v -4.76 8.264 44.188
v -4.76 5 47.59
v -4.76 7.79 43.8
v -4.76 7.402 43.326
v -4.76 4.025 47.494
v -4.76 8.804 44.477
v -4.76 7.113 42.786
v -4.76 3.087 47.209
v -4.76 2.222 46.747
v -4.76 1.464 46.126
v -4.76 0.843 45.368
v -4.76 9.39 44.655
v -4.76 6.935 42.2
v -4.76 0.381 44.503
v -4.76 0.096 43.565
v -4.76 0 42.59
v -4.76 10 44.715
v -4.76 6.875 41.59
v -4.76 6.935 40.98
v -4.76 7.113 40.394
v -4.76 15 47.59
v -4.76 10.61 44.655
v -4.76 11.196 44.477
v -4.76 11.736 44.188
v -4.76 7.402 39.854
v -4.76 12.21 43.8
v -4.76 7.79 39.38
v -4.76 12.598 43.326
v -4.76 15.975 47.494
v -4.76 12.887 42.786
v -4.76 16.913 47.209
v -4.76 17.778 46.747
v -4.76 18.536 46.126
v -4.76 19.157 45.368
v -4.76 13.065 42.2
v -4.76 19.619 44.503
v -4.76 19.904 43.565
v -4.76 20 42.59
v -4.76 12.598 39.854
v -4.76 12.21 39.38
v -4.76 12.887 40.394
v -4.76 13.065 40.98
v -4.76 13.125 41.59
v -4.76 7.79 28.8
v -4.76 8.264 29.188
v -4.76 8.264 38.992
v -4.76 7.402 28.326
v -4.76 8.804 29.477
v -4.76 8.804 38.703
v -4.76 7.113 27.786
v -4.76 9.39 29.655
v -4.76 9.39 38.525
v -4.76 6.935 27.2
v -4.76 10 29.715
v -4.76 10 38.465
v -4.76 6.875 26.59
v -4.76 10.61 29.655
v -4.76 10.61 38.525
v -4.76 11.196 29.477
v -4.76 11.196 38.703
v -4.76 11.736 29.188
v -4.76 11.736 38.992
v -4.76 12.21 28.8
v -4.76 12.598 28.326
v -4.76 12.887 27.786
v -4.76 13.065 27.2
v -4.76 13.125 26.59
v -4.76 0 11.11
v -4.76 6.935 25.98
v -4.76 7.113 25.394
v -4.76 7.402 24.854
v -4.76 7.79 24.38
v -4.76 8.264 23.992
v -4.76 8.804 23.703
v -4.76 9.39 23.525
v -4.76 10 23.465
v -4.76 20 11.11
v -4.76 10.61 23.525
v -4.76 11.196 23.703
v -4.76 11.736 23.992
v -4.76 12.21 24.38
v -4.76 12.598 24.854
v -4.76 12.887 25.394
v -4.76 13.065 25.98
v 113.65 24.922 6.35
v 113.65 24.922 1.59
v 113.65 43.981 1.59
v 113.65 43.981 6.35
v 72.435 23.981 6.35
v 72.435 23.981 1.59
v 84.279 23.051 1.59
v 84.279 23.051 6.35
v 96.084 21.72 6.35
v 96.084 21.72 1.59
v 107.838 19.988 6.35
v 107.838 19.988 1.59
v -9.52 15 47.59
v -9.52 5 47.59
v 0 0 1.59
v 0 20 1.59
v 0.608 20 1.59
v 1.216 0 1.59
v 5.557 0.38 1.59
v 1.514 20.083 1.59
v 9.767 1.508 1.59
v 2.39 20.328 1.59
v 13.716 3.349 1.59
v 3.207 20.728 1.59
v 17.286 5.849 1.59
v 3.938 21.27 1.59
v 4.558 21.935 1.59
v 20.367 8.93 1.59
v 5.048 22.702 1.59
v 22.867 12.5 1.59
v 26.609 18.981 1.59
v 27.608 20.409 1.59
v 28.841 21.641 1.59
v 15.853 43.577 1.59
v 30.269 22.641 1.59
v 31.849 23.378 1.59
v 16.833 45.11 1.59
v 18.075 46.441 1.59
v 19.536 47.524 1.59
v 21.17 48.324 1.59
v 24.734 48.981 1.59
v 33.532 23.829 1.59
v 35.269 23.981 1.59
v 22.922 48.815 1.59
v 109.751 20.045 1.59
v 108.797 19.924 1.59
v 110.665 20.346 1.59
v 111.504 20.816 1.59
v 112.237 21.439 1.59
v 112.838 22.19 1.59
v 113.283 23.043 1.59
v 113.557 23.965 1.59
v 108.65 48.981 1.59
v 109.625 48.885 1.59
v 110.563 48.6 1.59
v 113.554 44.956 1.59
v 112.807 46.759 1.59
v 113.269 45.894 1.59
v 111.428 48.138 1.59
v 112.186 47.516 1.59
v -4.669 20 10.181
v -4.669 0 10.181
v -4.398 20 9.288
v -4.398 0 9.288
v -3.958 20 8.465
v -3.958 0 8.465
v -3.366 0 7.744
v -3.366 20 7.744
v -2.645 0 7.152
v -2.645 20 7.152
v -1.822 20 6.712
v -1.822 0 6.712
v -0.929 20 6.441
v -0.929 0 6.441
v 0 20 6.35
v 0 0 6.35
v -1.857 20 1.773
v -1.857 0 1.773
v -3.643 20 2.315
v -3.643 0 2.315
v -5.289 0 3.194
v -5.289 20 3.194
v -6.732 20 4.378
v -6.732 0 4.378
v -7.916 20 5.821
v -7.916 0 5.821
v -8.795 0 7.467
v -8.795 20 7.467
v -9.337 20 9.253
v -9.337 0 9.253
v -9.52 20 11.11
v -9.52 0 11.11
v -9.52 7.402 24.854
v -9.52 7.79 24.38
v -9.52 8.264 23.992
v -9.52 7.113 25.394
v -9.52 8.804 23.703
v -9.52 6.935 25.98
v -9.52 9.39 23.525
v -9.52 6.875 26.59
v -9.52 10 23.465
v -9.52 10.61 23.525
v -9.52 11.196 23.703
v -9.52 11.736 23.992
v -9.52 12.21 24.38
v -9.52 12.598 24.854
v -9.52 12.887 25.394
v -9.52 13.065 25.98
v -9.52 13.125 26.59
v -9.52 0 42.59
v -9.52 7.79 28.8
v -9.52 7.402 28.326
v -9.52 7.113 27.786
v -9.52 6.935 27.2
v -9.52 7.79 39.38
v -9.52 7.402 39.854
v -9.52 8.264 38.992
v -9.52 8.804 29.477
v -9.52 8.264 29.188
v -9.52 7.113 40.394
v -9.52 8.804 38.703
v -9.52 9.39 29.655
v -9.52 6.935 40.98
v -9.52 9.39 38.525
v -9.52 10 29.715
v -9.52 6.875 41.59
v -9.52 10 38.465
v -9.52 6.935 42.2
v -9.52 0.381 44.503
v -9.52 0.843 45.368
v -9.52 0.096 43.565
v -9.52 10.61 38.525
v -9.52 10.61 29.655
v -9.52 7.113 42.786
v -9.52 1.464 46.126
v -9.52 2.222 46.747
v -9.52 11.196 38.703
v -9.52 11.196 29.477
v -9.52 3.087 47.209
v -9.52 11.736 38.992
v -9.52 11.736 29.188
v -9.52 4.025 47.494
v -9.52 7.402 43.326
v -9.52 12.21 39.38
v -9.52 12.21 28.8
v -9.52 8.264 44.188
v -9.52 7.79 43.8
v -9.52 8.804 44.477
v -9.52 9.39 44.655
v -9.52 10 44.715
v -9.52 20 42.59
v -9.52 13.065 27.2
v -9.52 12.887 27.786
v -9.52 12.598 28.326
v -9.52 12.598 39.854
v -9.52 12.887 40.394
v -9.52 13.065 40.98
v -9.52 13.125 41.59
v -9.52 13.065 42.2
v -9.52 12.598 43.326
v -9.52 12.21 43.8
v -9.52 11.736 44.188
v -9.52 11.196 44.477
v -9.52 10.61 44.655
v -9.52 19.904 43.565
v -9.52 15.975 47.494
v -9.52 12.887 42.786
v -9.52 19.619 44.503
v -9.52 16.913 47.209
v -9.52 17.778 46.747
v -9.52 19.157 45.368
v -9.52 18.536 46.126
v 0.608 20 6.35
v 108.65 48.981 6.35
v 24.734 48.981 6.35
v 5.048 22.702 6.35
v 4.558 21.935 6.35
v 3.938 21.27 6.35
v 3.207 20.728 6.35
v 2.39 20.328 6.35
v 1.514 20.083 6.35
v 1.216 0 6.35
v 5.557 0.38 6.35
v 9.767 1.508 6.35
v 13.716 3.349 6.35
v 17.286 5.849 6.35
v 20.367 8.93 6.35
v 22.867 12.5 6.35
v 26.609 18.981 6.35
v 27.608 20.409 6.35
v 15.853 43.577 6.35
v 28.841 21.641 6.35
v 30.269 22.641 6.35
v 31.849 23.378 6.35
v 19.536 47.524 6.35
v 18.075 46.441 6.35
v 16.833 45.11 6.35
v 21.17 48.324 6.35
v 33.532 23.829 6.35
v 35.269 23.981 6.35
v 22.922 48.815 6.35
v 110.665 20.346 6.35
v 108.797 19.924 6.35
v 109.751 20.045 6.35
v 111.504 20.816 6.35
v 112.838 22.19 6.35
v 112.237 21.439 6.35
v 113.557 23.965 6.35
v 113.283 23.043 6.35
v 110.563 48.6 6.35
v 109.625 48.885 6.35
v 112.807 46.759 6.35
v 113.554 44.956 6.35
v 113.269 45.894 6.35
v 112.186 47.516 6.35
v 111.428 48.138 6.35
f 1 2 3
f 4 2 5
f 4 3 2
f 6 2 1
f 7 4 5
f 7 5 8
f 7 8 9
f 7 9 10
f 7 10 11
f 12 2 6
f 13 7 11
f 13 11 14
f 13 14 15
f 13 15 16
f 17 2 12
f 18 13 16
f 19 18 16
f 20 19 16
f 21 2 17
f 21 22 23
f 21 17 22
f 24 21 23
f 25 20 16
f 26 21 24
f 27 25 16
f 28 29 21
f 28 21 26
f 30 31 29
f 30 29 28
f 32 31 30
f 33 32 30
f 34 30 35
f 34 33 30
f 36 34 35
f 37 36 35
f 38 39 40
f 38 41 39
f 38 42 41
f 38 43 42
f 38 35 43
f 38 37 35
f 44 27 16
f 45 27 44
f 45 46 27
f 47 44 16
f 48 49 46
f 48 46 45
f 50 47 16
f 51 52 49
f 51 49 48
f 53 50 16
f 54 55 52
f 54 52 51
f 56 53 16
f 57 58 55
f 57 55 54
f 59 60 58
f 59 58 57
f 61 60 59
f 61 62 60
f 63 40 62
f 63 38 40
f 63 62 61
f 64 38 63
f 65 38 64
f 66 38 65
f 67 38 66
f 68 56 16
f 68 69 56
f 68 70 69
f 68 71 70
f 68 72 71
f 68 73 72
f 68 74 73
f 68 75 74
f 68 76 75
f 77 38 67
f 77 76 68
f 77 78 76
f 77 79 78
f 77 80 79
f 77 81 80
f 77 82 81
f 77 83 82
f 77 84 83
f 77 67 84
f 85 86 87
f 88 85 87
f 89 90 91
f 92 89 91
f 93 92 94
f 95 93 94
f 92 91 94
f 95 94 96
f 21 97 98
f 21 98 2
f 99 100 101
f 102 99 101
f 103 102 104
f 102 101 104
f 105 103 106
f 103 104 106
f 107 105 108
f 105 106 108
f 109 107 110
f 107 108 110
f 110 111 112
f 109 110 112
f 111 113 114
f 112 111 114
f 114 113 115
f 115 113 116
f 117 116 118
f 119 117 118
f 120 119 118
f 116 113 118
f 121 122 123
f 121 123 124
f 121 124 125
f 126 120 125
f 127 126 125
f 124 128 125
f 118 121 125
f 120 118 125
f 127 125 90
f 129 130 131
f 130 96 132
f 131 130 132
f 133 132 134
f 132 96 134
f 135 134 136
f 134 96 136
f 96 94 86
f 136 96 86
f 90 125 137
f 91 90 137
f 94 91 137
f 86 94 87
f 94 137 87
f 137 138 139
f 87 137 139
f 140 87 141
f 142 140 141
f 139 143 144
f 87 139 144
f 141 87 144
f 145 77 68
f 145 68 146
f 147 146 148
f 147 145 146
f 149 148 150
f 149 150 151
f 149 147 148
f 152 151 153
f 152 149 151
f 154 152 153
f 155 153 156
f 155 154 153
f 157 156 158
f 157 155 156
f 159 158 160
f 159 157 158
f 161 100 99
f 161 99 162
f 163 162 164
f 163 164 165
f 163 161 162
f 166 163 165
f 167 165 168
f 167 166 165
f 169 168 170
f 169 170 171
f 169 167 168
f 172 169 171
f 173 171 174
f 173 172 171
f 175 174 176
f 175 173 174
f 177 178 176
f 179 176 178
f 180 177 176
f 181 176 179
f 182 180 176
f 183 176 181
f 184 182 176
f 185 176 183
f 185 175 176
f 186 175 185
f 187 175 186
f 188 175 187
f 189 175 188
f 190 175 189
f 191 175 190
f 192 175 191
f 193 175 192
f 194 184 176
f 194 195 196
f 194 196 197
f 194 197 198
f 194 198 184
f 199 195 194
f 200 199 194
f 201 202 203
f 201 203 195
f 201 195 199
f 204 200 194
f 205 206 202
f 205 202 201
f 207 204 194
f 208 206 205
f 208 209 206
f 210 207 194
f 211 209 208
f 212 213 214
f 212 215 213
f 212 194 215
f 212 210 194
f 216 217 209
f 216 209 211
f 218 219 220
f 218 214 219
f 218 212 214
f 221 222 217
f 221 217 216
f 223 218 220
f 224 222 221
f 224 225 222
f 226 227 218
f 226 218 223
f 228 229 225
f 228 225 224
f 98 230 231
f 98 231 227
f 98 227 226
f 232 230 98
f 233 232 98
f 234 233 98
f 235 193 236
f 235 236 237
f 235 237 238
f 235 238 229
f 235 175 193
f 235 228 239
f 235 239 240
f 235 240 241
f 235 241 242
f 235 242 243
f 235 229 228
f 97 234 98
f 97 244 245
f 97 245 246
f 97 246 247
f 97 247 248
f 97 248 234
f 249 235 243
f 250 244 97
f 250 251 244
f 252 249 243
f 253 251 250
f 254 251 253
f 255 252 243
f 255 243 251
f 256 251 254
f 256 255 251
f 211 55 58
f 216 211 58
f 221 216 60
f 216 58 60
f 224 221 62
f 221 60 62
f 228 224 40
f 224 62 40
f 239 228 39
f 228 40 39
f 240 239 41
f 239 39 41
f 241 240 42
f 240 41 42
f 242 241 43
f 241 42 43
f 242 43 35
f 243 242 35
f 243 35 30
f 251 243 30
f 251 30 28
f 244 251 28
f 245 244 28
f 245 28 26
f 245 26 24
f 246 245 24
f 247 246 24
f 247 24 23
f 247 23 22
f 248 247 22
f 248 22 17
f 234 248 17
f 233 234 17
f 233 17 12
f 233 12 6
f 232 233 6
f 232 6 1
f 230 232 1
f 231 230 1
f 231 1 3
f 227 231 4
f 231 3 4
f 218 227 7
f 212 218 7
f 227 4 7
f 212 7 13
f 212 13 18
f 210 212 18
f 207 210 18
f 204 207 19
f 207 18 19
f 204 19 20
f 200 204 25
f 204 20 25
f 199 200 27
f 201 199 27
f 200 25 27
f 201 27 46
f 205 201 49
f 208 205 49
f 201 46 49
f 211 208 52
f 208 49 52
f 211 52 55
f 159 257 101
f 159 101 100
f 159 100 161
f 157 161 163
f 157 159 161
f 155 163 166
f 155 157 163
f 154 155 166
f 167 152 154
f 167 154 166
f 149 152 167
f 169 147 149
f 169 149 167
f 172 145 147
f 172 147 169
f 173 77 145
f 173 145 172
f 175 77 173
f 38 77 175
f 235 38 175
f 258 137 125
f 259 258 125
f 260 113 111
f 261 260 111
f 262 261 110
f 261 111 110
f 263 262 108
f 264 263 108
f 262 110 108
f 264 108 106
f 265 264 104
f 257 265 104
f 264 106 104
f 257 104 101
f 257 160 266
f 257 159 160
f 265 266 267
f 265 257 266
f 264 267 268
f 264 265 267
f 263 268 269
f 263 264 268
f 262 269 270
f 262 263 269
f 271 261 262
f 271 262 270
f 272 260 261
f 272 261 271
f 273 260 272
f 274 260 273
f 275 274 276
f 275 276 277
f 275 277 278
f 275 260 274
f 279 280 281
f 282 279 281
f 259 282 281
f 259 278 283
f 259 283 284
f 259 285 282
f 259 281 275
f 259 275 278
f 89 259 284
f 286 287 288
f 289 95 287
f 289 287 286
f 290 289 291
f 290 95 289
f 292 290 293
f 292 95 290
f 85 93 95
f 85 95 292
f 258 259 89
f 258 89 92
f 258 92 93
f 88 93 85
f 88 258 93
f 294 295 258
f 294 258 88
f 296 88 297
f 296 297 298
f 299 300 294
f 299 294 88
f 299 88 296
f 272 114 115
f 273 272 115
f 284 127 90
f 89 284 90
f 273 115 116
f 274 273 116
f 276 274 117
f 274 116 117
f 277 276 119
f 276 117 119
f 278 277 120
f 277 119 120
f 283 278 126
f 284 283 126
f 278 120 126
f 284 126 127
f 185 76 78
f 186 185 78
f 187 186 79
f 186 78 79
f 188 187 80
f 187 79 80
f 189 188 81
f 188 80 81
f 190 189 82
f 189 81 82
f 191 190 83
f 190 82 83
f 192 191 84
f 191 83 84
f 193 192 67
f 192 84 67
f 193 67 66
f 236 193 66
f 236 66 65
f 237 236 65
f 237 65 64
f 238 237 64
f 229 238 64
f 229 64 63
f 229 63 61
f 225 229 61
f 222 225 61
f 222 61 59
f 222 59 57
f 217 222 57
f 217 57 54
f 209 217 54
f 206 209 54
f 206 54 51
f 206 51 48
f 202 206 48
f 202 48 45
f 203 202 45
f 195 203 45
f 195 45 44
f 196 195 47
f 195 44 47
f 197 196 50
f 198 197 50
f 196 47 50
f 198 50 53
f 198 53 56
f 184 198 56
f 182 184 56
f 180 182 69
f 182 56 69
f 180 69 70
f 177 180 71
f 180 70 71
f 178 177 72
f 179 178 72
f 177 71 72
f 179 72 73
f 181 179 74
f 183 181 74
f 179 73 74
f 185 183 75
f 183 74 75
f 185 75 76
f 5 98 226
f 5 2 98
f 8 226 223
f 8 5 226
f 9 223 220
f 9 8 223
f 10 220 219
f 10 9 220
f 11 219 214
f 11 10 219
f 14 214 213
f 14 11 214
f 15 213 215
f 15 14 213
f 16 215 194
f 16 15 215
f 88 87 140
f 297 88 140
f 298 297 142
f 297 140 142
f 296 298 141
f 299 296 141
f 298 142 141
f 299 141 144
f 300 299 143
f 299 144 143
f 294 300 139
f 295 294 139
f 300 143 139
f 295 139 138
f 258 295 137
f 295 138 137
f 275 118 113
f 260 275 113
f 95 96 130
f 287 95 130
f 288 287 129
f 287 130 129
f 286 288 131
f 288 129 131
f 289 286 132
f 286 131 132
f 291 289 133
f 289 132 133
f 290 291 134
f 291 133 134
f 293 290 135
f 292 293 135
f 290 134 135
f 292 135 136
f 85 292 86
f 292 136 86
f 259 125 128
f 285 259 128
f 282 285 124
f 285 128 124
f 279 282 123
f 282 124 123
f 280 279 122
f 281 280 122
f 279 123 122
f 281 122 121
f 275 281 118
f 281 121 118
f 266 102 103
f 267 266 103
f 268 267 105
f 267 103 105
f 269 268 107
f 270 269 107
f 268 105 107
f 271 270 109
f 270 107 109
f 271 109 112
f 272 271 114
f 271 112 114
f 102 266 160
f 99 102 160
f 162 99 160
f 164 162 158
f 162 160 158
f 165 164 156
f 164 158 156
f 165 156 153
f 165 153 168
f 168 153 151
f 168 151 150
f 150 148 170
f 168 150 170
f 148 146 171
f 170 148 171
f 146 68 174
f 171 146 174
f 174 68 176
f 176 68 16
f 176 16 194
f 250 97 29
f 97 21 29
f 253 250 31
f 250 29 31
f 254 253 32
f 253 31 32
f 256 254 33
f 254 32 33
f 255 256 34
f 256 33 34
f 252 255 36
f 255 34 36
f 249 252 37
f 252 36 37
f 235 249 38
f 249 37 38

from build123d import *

# Parameters (mm, degrees)
SALIENTE_EXTRUIR1_DEPTH = 6.35
CONVERTIR_S_LIDO1_DEPTH = 1.59
BRIDA_DE_ARISTA1_DEPTH  = 20
REDONDEO1_R             = 5
CORTAR_EXTRUIR1_REACH   = 138.693
CROQUIS11_R             = 3.125


# Read off the part's stored shape, not the designer's step: Convertir-Sólido1
# Sheet-metal steps are written as plain solids
with BuildPart() as part:
    # Croquis1 → Saliente-Extruir1 (new body)
    with BuildSketch(Plane.XY):
        with BuildLine():
            Line((0, 0), (1.21624327, 0))
            ThreePointArc((1.21624327, 0), (13.71624327, 3.349364905), (22.866878365, 12.5))
            Line((22.866878365, 12.5), (26.608548116, 18.980762114))
            ThreePointArc((26.608548116, 18.980762114), (30.268802154, 22.641016151), (35.268802154, 23.980762114))
            Line((35.268802154, 23.980762114), (72.43532503, 23.980762114))
            ThreePointArc((72.43532503, 23.980762114), (90.187263937, 22.435296605), (107.837539609, 19.988345998))
            ThreePointArc((107.837539609, 19.988345998), (111.885560079, 21.109920556), (113.65, 24.921895239))
            Line((113.65, 24.921895239), (113.65, 43.980762114))
            ThreePointArc((113.65, 43.980762114), (112.185533906, 47.516296019), (108.65, 48.980762114))
            Line((108.65, 48.980762114), (24.734232406, 48.980762114))
            ThreePointArc((24.734232406, 48.980762114), (19.536461106, 47.523781106), (15.853300619, 43.577396815))
            Line((15.853300619, 43.577396815), (5.048349691, 22.701682649))
            ThreePointArc((5.048349691, 22.701682649), (3.206769447, 20.728490504), (0.607883797, 20))
            Line((0.607883797, 20), (0, 20))
            Line((0, 20), (0, 0))
        make_face()
    extrude(amount=SALIENTE_EXTRUIR1_DEPTH)

    # Convertir-Sólido1 outline → Convertir-Sólido1 (cut)
    with BuildSketch(Plane.XY):
        with BuildLine():
            Line((0, 20), (0, 0))
            Line((0, 0), (1.21624327, 0))
            ThreePointArc((1.21624327, 0), (13.71624327, 3.349364905), (22.866878365, 12.5))
            Line((22.866878365, 12.5), (26.608548116, 18.980762114))
            ThreePointArc((26.608548116, 18.980762114), (30.268802154, 22.641016151), (35.268802154, 23.980762114))
            Line((35.268802154, 23.980762114), (72.43532503, 23.980762114))
            ThreePointArc((72.43532503, 23.980762114), (90.187263937, 22.435296605), (107.837539609, 19.988345998))
            ThreePointArc((107.837539609, 19.988345998), (111.885560079, 21.109920556), (113.65, 24.921895239))
            Line((113.65, 24.921895239), (113.65, 43.980762114))
            ThreePointArc((113.65, 43.980762114), (112.185533906, 47.516296019), (108.65, 48.980762114))
            Line((108.65, 48.980762114), (24.734232406, 48.980762114))
            ThreePointArc((24.734232406, 48.980762114), (19.536461106, 47.523781106), (15.853300619, 43.577396815))
            Line((15.853300619, 43.577396815), (5.048349691, 22.701682649))
            ThreePointArc((5.048349691, 22.701682649), (3.206769447, 20.728490504), (0.607883797, 20))
            Line((0.607883797, 20), (0, 20))
        make_face()
    extrude(amount=CONVERTIR_S_LIDO1_DEPTH, mode=Mode.SUBTRACT)

    # Brida de arista1 section (across the edge) → Brida de arista1 (add)
    with BuildSketch(Plane(origin=(-4.76, 20, 6.35), x_dir=(1, 0, 0), z_dir=(0, -1, 0))):
        with BuildLine():
            Line((-4.76, 4.76), (-4.76, 41.24))
            Line((-4.76, 41.24), (0, 41.24))
            Line((0, 41.24), (0, 4.76))
            ThreePointArc((0, 4.76), (1.394171722, 1.394171722), (4.76, 0))
            Line((4.76, 0), (4.76, -4.76))
            ThreePointArc((4.76, -4.76), (-1.971656557, -1.971656557), (-4.76, 4.76))
        make_face()
    extrude(amount=BRIDA_DE_ARISTA1_DEPTH)

    # Redondeo1
    redondeo1_edges = [part.edges().sort_by_distance(p)[0] for p in [
        (-7.14, 20, 47.59),
        (-7.14, 0, 47.59),
    ]]
    fillet(redondeo1_edges, radius=REDONDEO1_R)

    # Croquis11 → Cortar-Extruir1 (cut, up to next)
    with BuildSketch(Plane(origin=(-4.76, 0, 0), x_dir=(0, 0, -1), z_dir=(1, 0, 0)), mode=Mode.PRIVATE) as cortar_extruir1_sk1:
        with Locations((-41.59, 10)):
            Circle(CROQUIS11_R)
    cortar_extruir1_tool1 = extrude(cortar_extruir1_sk1.sketch, amount=-CORTAR_EXTRUIR1_REACH, mode=Mode.PRIVATE) & part.part
    # Croquis11 → Cortar-Extruir1 (cut, up to next)
    with BuildSketch(Plane(origin=(-4.76, 0, 0), x_dir=(0, 0, -1), z_dir=(1, 0, 0)), mode=Mode.PRIVATE) as cortar_extruir1_sk2:
        with Locations((-26.59, 10)):
            Circle(CROQUIS11_R)
    cortar_extruir1_tool2 = extrude(cortar_extruir1_sk2.sketch, amount=-CORTAR_EXTRUIR1_REACH, mode=Mode.PRIVATE) & part.part
    add(cortar_extruir1_tool1.solids().sort_by_distance((-4.76, 10, 41.59))[0], mode=Mode.SUBTRACT)
    add(cortar_extruir1_tool2.solids().sort_by_distance((-4.76, 10, 26.59))[0], mode=Mode.SUBTRACT)


solid = part.part
